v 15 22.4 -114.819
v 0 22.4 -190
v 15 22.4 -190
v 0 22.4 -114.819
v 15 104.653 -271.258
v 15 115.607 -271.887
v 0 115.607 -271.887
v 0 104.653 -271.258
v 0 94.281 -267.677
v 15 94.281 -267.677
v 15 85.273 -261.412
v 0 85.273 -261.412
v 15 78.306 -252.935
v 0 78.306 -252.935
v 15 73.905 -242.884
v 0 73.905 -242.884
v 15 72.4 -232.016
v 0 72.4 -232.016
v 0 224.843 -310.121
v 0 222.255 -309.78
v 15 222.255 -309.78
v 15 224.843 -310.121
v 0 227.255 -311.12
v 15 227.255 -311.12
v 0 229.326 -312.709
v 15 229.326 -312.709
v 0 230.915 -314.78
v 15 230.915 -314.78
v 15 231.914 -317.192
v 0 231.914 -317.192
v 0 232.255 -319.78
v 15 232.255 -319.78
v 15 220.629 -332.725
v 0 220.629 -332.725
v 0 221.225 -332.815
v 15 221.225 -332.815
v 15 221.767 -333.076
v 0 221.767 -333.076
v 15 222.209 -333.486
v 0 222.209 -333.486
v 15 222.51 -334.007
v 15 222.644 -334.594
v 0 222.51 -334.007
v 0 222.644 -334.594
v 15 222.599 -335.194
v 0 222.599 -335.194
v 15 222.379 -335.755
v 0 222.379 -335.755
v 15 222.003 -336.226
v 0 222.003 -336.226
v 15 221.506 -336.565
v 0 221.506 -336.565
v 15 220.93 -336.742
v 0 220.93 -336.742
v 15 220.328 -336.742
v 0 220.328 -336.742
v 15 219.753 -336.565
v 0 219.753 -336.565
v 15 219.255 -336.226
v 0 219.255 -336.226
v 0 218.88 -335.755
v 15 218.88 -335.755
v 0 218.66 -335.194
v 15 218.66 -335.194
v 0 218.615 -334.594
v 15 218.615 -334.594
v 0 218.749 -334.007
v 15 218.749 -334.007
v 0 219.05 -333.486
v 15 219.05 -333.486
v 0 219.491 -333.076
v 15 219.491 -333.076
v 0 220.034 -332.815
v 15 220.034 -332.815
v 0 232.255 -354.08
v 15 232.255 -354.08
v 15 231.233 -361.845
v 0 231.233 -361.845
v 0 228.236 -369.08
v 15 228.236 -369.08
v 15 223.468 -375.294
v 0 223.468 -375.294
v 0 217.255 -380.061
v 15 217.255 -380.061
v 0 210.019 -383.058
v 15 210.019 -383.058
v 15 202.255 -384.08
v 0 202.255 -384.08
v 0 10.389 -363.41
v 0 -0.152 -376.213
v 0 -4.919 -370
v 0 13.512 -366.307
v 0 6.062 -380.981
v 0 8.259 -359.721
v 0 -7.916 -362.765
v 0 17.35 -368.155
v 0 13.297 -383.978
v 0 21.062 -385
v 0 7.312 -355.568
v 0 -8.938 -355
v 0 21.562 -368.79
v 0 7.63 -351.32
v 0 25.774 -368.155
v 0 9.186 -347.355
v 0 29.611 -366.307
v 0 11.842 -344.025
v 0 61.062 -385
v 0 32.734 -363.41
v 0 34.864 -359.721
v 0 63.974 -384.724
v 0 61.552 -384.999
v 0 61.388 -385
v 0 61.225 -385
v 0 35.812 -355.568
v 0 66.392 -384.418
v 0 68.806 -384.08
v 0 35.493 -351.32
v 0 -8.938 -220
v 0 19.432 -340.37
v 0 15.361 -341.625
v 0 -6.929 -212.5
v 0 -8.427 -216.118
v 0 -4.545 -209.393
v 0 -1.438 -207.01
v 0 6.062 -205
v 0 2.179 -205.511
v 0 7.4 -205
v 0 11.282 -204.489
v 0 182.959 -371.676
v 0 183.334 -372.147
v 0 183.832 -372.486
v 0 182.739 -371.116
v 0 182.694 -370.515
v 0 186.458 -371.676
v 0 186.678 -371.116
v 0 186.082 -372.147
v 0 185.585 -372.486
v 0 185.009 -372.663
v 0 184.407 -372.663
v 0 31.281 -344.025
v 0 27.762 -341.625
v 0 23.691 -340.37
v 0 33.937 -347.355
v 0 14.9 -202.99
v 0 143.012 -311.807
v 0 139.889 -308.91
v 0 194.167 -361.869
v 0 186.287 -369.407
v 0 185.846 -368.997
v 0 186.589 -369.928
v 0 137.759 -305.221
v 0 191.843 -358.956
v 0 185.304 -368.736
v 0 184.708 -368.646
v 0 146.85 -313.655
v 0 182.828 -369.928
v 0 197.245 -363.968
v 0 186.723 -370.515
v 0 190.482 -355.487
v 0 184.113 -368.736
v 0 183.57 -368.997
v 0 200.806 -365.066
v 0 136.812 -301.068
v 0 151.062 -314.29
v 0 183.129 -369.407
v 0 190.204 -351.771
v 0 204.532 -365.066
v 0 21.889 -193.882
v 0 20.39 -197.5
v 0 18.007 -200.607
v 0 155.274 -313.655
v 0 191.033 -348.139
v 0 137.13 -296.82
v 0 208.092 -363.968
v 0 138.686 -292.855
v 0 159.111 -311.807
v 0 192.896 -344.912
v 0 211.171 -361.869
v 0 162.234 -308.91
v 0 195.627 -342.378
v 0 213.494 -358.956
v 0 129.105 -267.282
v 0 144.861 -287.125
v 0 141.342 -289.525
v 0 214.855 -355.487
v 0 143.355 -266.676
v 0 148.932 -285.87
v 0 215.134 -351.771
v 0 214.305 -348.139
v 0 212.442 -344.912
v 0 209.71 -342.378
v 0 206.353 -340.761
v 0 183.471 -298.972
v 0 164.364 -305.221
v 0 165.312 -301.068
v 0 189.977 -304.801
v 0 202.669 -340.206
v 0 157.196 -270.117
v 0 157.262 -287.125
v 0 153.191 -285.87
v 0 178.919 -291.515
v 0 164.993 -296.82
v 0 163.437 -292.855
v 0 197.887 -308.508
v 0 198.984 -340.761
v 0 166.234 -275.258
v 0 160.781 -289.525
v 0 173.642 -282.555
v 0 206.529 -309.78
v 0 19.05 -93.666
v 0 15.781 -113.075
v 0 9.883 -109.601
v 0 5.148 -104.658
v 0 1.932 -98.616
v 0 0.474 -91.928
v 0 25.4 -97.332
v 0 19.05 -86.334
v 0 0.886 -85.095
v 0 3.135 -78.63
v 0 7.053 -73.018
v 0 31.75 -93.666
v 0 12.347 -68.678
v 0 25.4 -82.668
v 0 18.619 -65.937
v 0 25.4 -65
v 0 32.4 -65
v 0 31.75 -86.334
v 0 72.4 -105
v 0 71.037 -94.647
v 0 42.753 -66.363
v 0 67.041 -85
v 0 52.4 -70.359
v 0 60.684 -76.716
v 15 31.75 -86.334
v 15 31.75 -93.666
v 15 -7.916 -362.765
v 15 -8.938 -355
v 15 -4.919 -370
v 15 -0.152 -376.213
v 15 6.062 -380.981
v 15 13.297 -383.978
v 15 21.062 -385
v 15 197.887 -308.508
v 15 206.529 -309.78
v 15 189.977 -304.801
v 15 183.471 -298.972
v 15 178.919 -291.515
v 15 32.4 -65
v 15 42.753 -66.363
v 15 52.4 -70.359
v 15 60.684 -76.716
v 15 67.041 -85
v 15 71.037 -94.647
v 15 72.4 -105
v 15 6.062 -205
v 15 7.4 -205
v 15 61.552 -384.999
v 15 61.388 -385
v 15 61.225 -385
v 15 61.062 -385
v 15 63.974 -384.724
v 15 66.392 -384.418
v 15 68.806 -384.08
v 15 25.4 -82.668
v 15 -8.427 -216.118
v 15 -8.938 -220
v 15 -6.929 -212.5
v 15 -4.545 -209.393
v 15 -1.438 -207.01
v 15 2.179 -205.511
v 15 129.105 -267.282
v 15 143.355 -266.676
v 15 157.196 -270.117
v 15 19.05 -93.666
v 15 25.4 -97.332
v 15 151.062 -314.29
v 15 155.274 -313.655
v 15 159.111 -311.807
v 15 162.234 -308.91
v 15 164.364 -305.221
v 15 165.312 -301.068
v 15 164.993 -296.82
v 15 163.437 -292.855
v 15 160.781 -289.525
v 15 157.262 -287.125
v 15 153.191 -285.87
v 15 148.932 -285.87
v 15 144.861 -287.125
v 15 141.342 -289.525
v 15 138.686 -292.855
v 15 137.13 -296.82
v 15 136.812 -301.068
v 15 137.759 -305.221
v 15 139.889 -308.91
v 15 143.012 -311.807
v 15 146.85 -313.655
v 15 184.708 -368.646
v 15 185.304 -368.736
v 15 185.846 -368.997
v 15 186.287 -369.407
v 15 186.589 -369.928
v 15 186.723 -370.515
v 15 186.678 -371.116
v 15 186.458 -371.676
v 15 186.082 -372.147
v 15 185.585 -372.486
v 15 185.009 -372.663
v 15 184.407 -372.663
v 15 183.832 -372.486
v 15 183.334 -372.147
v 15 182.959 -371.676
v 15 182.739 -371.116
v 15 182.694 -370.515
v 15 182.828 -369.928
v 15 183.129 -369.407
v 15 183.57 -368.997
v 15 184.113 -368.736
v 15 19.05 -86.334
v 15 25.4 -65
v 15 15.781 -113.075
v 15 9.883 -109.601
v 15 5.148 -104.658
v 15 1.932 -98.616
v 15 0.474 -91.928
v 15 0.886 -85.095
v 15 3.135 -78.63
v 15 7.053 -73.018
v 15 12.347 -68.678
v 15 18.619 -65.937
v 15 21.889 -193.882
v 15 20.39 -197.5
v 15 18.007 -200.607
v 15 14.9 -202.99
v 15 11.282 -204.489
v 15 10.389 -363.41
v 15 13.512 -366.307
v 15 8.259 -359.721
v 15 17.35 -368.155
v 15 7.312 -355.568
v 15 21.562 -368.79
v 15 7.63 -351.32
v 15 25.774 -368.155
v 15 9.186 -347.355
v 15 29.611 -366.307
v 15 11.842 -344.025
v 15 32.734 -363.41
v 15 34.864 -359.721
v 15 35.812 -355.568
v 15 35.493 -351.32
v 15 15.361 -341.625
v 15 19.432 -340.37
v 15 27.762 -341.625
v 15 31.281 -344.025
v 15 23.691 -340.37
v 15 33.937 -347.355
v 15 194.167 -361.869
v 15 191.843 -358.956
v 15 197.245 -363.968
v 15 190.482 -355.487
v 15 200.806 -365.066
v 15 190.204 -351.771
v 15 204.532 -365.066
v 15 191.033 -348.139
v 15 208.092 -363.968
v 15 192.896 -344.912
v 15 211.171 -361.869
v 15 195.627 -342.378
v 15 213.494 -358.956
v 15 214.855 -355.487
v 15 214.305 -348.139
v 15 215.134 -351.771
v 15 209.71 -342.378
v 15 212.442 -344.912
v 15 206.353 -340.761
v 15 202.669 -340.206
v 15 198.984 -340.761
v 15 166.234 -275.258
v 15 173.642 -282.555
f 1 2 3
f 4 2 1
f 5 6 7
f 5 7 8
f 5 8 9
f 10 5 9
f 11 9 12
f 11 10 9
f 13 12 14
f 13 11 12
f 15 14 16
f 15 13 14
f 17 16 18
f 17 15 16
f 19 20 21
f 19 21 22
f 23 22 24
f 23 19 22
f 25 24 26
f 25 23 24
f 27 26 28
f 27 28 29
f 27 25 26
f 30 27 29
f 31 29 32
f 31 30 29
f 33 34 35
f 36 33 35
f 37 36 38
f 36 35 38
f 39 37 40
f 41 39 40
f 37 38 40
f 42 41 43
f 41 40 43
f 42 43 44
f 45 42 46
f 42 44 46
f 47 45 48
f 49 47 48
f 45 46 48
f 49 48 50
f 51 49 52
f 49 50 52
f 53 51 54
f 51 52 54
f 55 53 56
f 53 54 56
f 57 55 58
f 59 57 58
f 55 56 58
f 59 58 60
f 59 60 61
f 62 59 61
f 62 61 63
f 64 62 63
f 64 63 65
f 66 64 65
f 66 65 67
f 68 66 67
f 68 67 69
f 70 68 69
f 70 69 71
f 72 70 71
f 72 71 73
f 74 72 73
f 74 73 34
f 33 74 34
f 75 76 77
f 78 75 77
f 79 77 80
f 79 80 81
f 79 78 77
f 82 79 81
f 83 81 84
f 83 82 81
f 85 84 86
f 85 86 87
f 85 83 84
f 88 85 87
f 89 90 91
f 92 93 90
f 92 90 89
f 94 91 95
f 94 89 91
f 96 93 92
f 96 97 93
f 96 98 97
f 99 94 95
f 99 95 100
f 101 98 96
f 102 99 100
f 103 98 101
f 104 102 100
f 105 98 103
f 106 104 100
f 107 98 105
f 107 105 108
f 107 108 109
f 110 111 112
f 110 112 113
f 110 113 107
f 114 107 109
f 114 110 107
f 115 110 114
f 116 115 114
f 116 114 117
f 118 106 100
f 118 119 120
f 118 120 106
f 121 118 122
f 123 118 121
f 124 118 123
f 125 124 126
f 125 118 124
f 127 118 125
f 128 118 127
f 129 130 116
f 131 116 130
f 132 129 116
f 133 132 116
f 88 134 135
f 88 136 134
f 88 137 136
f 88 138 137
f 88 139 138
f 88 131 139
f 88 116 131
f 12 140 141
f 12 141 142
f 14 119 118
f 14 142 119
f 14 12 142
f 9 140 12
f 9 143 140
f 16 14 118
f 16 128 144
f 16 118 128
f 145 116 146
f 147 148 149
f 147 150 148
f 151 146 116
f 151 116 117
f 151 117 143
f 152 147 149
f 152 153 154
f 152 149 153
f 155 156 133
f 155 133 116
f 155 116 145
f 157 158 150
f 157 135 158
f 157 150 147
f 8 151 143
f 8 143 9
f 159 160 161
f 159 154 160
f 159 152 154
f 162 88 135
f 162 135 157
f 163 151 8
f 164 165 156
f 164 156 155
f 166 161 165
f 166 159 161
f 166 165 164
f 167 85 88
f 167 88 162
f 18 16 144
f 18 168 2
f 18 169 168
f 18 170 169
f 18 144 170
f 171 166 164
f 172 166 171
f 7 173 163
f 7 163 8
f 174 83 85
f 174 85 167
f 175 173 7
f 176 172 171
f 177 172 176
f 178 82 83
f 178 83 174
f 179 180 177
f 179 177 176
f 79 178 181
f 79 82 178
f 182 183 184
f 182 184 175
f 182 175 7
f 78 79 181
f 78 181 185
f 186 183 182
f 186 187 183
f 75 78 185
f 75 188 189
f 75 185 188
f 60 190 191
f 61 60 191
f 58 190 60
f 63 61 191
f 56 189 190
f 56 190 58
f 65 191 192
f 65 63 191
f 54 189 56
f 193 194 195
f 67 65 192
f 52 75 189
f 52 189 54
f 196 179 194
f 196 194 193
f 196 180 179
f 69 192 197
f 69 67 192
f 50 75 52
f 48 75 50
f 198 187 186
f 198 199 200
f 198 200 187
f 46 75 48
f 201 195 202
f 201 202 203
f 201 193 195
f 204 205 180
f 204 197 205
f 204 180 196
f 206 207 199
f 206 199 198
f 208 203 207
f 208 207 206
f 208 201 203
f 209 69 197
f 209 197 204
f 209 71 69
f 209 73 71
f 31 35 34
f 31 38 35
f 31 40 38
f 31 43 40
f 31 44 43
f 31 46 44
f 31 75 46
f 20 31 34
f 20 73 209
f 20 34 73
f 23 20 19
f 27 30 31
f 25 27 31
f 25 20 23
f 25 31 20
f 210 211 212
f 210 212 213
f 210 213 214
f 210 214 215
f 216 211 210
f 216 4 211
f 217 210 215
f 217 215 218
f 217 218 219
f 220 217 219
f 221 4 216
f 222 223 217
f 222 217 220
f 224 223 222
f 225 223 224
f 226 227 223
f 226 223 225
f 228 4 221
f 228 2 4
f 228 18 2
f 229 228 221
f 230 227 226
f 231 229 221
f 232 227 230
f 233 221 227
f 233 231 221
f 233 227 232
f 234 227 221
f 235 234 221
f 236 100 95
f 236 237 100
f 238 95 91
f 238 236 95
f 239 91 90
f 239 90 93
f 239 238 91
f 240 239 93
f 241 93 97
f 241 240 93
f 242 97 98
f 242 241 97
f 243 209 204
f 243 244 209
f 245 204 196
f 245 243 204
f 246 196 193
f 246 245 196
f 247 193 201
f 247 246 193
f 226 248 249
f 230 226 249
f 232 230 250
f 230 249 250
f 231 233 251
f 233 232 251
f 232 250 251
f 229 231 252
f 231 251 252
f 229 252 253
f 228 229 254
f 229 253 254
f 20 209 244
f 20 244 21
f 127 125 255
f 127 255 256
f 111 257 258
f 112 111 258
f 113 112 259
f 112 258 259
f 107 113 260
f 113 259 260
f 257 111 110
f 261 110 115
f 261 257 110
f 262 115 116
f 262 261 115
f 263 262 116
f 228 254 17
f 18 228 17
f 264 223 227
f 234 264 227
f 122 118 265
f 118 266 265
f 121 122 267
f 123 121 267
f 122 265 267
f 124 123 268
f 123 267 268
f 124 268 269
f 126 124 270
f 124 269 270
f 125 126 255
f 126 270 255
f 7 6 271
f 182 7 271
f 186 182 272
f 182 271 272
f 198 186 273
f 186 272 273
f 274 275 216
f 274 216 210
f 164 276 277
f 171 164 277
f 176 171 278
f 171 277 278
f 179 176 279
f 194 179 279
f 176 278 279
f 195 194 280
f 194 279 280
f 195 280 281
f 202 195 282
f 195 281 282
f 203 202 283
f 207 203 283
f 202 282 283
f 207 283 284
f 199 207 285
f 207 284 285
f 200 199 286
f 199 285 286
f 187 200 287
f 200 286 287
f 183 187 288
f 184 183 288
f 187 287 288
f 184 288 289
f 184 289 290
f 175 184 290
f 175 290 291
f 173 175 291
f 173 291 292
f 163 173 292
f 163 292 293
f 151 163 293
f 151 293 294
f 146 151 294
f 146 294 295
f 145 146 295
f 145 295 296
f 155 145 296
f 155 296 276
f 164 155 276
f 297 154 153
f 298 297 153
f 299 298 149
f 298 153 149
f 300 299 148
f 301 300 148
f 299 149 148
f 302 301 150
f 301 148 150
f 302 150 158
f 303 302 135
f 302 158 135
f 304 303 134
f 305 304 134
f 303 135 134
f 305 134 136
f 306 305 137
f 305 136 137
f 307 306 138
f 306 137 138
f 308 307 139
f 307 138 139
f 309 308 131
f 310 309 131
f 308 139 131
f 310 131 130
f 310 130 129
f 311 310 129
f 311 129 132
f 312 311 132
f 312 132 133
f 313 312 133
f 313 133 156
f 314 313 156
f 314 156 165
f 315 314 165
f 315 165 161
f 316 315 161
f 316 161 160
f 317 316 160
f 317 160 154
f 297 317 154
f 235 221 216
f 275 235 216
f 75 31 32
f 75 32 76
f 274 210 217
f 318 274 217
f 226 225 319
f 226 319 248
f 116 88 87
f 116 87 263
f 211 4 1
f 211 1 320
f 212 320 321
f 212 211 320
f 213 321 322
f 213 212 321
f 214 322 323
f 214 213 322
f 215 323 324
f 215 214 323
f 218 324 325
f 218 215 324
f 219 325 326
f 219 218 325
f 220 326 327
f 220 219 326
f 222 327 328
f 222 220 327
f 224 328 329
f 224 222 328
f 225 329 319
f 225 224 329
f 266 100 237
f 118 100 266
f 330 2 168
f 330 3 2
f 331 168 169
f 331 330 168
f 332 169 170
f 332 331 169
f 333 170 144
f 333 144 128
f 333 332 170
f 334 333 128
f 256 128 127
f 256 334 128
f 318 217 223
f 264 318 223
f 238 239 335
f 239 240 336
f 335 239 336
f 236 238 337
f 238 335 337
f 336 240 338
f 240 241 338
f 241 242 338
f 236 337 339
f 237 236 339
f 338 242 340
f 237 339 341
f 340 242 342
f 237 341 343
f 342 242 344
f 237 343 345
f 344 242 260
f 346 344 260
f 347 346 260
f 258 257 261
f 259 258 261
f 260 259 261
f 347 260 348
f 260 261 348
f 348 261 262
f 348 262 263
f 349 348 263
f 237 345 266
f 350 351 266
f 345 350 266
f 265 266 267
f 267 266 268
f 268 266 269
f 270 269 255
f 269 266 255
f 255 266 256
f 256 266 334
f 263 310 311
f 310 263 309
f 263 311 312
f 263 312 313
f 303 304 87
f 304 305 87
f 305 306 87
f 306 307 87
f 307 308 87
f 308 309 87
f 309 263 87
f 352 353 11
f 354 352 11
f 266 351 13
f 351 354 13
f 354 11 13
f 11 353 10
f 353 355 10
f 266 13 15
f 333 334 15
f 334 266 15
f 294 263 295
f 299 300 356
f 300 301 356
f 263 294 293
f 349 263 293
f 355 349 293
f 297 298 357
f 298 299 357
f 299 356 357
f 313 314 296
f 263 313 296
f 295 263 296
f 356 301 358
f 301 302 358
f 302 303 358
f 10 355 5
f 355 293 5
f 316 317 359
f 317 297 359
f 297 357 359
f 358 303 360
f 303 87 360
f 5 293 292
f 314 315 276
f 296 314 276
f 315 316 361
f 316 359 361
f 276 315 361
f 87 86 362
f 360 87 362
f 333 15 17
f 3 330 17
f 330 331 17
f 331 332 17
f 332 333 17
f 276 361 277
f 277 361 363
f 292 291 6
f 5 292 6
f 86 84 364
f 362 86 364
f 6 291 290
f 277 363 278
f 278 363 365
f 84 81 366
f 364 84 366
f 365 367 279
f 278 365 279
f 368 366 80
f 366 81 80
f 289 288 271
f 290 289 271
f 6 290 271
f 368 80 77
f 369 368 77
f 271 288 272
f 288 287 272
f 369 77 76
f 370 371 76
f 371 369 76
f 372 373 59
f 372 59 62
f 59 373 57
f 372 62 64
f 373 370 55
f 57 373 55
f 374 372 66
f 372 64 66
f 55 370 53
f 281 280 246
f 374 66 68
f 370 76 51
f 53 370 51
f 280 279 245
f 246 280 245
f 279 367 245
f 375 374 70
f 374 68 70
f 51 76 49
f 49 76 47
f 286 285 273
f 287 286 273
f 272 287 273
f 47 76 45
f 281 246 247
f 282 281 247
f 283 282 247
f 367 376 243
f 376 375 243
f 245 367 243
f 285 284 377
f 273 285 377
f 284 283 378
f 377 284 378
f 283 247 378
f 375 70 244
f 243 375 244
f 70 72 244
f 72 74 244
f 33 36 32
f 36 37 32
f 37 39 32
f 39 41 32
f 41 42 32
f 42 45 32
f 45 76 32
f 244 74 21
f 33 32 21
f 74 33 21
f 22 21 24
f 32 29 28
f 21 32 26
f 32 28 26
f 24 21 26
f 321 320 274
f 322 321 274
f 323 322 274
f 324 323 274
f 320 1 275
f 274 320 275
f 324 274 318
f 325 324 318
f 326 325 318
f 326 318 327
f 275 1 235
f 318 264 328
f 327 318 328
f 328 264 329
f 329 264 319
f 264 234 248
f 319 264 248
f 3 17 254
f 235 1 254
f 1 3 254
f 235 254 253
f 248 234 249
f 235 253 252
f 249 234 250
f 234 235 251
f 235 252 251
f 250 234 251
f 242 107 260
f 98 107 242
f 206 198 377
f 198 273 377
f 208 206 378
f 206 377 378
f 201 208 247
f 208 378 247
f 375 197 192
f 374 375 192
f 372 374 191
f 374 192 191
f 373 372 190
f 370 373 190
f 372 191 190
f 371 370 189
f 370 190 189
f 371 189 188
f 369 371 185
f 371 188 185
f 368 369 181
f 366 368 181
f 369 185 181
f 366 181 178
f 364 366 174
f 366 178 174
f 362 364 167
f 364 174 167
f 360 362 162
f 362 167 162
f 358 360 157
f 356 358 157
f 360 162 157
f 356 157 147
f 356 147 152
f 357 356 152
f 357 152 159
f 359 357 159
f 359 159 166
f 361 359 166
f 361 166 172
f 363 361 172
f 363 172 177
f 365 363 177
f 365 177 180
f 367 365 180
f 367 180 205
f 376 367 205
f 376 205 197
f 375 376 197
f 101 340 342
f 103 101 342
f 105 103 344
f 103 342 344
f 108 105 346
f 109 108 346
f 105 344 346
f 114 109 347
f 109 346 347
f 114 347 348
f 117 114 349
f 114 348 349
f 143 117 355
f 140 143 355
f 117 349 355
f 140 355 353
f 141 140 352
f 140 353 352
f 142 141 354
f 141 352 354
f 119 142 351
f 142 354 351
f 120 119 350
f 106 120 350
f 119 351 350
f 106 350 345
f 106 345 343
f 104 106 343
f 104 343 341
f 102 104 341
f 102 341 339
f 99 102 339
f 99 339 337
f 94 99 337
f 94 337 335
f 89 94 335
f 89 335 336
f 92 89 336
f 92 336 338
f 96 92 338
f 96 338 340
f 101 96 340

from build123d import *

# Parameters (mm, degrees)
SALIENTE_EXTRUIR1_DEPTH = 15
CORTAR_EXTRUIR1_DEPTH   = 477.91260816
REDONDEO1_R             = 220
REDONDEO2_R             = 70
REDONDEO3_R             = 15
REDONDEO4_R             = 30
CROQUIS7_R              = 14.29
CORTAR_EXTRUIR5_DEPTH   = 477.91260816
CROQUIS8_R              = 14.29
CORTAR_EXTRUIR6_DEPTH   = 523
CORTAR_EXTRUIR12_DEPTH  = 477.91260816
REDONDEO5_R             = 40
CORTAR_EXTRUIR13_DEPTH  = 429.85874997
REDONDEO6_R             = 40
SALIENTE_EXTRUIR3_DEPTH = 15
SALIENTE_EXTRUIR4_DEPTH = 15
CROQUIS21_R             = 2.02
CROQUIS21_R_2           = 12.5
CORTAR_EXTRUIR17_DEPTH  = 450.880285455
REDONDEO7_R             = 30


with BuildPart() as part:
    # Croquis1 → Saliente-Extruir1 (new body)
    with BuildSketch(Plane(origin=(0, 0, 0), x_dir=(0, 0, -1), z_dir=(1, 0, 0))):
        with BuildLine():
            Line((65, 25.4), (65, 281.06162282))
            Line((65, 281.06162282), (385, 281.06162282))
            Line((385, 281.06162282), (385, -8.93837718))
            Line((385, -8.93837718), (205, -8.93837718))
            Line((205, -8.93837718), (205, 22.4))
            Line((205, 22.4), (115, 22.4))
            Line((115, 22.4), (114.819347292, 22.4))
            ThreePointArc((114.819347292, 22.4), (88.497282844, 0.445204045), (65, 25.4))
        make_face()
    extrude(amount=SALIENTE_EXTRUIR1_DEPTH)

    # Croquis2 → Cortar-Extruir1 (cut, through all)
    with BuildSketch(Plane.ZY):
        Polygon((-82.667651581, 25.4), (-86.333825791, 31.75), (-93.666174209, 31.75), (-97.332348419, 25.4), (-93.666174209, 19.05), (-86.333825791, 19.05), align=None)
    extrude(amount=-CORTAR_EXTRUIR1_DEPTH, mode=Mode.SUBTRACT)

    # Redondeo1
    redondeo1_edges = [part.edges().sort_by_distance(p)[0] for p in [
        (7.5, 281.06162282, -385),
    ]]
    fillet(redondeo1_edges, radius=REDONDEO1_R)

    # Redondeo2
    redondeo2_edges = [part.edges().sort_by_distance(p)[0] for p in [
        (7.5, 281.06162282, -65),
    ]]
    fillet(redondeo2_edges, radius=REDONDEO2_R)

    # Redondeo3
    redondeo3_edges = [part.edges().sort_by_distance(p)[0] for p in [
        (7.5, -8.93837718, -205),
        (7.5, 22.4, -205),
    ]]
    fillet(redondeo3_edges, radius=REDONDEO3_R)

    # Redondeo4
    redondeo4_edges = [part.edges().sort_by_distance(p)[0] for p in [
        (7.5, -8.93837718, -385),
    ]]
    fillet(redondeo4_edges, radius=REDONDEO4_R)

    # Croquis7 → Cortar-Extruir5 (cut, through all)
    with BuildSketch(Plane(origin=(15, 0, 0), x_dir=(0, 0, -1), z_dir=(1, 0, 0))):
        with Locations((354.499999998, 21.561622823)):
            Circle(CROQUIS7_R)
    extrude(amount=-CORTAR_EXTRUIR5_DEPTH, mode=Mode.SUBTRACT)

    # Croquis8 → Cortar-Extruir6 (cut)
    with BuildSketch(Plane(origin=(15, 0, 0), x_dir=(0, 0, -1), z_dir=(1, 0, 0))):
        with Locations((299.999999998, 151.061622823)):
            Circle(CROQUIS8_R)
    extrude(amount=-CORTAR_EXTRUIR6_DEPTH, mode=Mode.SUBTRACT)

    # Croquis14 → Cortar-Extruir12 (cut, through all)
    with BuildSketch(Plane(origin=(15, 0, 0), x_dir=(0, 0, -1), z_dir=(1, 0, 0))):
        with BuildLine():
            Line((65, 72.4), (270, 72.4))
            ThreePointArc((270, 72.4), (274.363902477, 93.8541681), (271.886825139, 115.607077367))
            ThreePointArc((271.886825139, 115.607077367), (293.695729554, 182.870527237), (360.959179423, 161.06162282))
            Line((360.959179423, 161.06162282), (409.037931036, 257.33581614))
            Line((409.037931036, 257.33581614), (105.335360325, 302.08857435))
            Line((105.335360325, 302.08857435), (0, 212.58305793))
            Line((0, 212.58305793), (65, 72.4))
        make_face()
    extrude(amount=-CORTAR_EXTRUIR12_DEPTH, mode=Mode.SUBTRACT)

    # Redondeo5
    # the kernel refuses this fillet: 40 mm, written as the material it adds along each edge
    with BuildSketch(Plane(origin=(15, 72.4, -270), x_dir=(0, 0.9990478553762716, -0.0436277740444352), z_dir=(-1, 0, 0))) as redondeo5_piece_1:
        with BuildLine():
            CenterArc((38.304739361, -39.69334508), REDONDEO5_R, 82.900783034, 94.598735986)
            Line((-1.657174854, -37.948234118), (0, 0))
            ThreePointArc((0, 0), (21.624127981, 3.423749812), (43.248255961, 0))
        make_face()
    extrude(amount=15)
    # the kernel refuses this fillet: 40 mm, written as the material it takes off along each edge
    with BuildSketch(Plane(origin=(115, 72.4, -65), x_dir=(0, 0, -1), z_dir=(-1, 0, 0))) as redondeo5_2_piece_1:
        with BuildLine():
            CenterArc((REDONDEO5_R, REDONDEO5_R), REDONDEO5_R, 180, 90)
            Line((0, REDONDEO5_R), (0, 0))
            Line((0, 0), (REDONDEO5_R, 0))
        make_face()
    extrude(amount=215, mode=Mode.SUBTRACT)

    # Croquis15 → Cortar-Extruir13 (cut, through all)
    with BuildSketch(Plane(origin=(15, 0, 0), x_dir=(0, 0, -1), z_dir=(1, 0, 0))):
        with BuildLine():
            Line((316.423002092, 188.334350095), (358.626196651, 190.922485323))
            Line((358.626196651, 190.922485323), (422.761195779, 101.20409943))
            Line((422.761195779, 101.20409943), (385, 21.06162282))
            ThreePointArc((385, 21.06162282), (371.881027209, 113.376882145), (316.423002092, 188.334350095))
        make_face()
    extrude(amount=-CORTAR_EXTRUIR13_DEPTH, mode=Mode.SUBTRACT)

    # Redondeo6
    # the kernel refuses this fillet: 40 mm, written as the material it takes off along each edge
    with BuildSketch(Plane(origin=(154.505258901, 188.334350095, -316.423002092), x_dir=(0, -0.5580210387188341, 0.8298268014153035), z_dir=(-1, 0, 0))) as redondeo6_piece_1:
        with BuildLine():
            CenterArc((33.481262136, -33.19307214), REDONDEO6_R, 56.080950646, 115.615192876)
            ThreePointArc((-6.099380682, -27.416159984), (-3.556977801, -13.59522176), (0, 0))
            ThreePointArc((0, 0), (27.90105178, 8.508659825), (55.802103561, 0))
        make_face()
    extrude(amount=294.010517803, mode=Mode.SUBTRACT)

    # Croquis18 → Saliente-Extruir3 (add, through all)
    with BuildSketch(Plane.ZY):
        with BuildLine():
            Line((-336.783225667, 168.987268689), (-324.9259333, 170.954067241))
            Line((-324.9259333, 170.954067241), (-309.780230989, 182.020805528))
            ThreePointArc((-309.780230989, 182.020805528), (-329.588467491, 188.570394011), (-336.783225667, 168.987268689))
        make_face()
    extrude(amount=-SALIENTE_EXTRUIR3_DEPTH)

    # Croquis20 → Saliente-Extruir4 (add, through all)
    with BuildSketch(Plane.ZY):
        with BuildLine():
            Line((-384.080413654, 202.254755045), (-384.080413654, 68.806205343))
            Line((-384.080413654, 68.806205343), (-355.955719628, 128.198236155))
            Line((-355.955719628, 128.198236155), (-350.988918253, 138.686827429))
            Line((-350.988918253, 138.686827429), (-333.391481861, 167.902196457))
            Line((-333.391481861, 167.902196457), (-333.391481861, 179.145496263))
            Line((-333.391481861, 179.145496263), (-331.848601066, 185.40903393))
            Line((-331.848601066, 185.40903393), (-327.722665886, 187.904048047))
            Line((-327.722665886, 187.904048047), (-321.465563641, 187.904048047))
            Line((-321.465563641, 187.904048047), (-315.23558207, 184.151512718))
            Line((-315.23558207, 184.151512718), (-309.780230989, 182.020805528))
            Line((-309.780230989, 182.020805528), (-309.780230989, 222.254755045))
            ThreePointArc((-309.780230989, 222.254755045), (-312.709163177, 229.325822857), (-319.780230989, 232.254755045))
            Line((-319.780230989, 232.254755045), (-354.080413654, 232.254755045))
            ThreePointArc((-354.080413654, 232.254755045), (-375.293617089, 223.467958481), (-384.080413654, 202.254755045))
        make_face()
    extrude(amount=-SALIENTE_EXTRUIR4_DEPTH)

    # Croquis21 → Cortar-Extruir17 (cut, through all)
    with BuildSketch(Plane.ZY):
        with Locations((-334.74499674, 220.62921413)):
            Circle(CROQUIS21_R)
        with Locations((-370.666021225, 184.708189645)):
            Circle(CROQUIS21_R)
        with Locations((-352.705508983, 202.668701887)):
            Circle(CROQUIS21_R_2)
    extrude(amount=-CORTAR_EXTRUIR17_DEPTH, mode=Mode.SUBTRACT)

    # Redondeo7
    redondeo7_edges = [part.edges().sort_by_distance(p)[0] for p in [
        (7.5, 182.020805528, -309.780230989),
    ]]
    fillet(redondeo7_edges, radius=REDONDEO7_R)


solid = part.part
